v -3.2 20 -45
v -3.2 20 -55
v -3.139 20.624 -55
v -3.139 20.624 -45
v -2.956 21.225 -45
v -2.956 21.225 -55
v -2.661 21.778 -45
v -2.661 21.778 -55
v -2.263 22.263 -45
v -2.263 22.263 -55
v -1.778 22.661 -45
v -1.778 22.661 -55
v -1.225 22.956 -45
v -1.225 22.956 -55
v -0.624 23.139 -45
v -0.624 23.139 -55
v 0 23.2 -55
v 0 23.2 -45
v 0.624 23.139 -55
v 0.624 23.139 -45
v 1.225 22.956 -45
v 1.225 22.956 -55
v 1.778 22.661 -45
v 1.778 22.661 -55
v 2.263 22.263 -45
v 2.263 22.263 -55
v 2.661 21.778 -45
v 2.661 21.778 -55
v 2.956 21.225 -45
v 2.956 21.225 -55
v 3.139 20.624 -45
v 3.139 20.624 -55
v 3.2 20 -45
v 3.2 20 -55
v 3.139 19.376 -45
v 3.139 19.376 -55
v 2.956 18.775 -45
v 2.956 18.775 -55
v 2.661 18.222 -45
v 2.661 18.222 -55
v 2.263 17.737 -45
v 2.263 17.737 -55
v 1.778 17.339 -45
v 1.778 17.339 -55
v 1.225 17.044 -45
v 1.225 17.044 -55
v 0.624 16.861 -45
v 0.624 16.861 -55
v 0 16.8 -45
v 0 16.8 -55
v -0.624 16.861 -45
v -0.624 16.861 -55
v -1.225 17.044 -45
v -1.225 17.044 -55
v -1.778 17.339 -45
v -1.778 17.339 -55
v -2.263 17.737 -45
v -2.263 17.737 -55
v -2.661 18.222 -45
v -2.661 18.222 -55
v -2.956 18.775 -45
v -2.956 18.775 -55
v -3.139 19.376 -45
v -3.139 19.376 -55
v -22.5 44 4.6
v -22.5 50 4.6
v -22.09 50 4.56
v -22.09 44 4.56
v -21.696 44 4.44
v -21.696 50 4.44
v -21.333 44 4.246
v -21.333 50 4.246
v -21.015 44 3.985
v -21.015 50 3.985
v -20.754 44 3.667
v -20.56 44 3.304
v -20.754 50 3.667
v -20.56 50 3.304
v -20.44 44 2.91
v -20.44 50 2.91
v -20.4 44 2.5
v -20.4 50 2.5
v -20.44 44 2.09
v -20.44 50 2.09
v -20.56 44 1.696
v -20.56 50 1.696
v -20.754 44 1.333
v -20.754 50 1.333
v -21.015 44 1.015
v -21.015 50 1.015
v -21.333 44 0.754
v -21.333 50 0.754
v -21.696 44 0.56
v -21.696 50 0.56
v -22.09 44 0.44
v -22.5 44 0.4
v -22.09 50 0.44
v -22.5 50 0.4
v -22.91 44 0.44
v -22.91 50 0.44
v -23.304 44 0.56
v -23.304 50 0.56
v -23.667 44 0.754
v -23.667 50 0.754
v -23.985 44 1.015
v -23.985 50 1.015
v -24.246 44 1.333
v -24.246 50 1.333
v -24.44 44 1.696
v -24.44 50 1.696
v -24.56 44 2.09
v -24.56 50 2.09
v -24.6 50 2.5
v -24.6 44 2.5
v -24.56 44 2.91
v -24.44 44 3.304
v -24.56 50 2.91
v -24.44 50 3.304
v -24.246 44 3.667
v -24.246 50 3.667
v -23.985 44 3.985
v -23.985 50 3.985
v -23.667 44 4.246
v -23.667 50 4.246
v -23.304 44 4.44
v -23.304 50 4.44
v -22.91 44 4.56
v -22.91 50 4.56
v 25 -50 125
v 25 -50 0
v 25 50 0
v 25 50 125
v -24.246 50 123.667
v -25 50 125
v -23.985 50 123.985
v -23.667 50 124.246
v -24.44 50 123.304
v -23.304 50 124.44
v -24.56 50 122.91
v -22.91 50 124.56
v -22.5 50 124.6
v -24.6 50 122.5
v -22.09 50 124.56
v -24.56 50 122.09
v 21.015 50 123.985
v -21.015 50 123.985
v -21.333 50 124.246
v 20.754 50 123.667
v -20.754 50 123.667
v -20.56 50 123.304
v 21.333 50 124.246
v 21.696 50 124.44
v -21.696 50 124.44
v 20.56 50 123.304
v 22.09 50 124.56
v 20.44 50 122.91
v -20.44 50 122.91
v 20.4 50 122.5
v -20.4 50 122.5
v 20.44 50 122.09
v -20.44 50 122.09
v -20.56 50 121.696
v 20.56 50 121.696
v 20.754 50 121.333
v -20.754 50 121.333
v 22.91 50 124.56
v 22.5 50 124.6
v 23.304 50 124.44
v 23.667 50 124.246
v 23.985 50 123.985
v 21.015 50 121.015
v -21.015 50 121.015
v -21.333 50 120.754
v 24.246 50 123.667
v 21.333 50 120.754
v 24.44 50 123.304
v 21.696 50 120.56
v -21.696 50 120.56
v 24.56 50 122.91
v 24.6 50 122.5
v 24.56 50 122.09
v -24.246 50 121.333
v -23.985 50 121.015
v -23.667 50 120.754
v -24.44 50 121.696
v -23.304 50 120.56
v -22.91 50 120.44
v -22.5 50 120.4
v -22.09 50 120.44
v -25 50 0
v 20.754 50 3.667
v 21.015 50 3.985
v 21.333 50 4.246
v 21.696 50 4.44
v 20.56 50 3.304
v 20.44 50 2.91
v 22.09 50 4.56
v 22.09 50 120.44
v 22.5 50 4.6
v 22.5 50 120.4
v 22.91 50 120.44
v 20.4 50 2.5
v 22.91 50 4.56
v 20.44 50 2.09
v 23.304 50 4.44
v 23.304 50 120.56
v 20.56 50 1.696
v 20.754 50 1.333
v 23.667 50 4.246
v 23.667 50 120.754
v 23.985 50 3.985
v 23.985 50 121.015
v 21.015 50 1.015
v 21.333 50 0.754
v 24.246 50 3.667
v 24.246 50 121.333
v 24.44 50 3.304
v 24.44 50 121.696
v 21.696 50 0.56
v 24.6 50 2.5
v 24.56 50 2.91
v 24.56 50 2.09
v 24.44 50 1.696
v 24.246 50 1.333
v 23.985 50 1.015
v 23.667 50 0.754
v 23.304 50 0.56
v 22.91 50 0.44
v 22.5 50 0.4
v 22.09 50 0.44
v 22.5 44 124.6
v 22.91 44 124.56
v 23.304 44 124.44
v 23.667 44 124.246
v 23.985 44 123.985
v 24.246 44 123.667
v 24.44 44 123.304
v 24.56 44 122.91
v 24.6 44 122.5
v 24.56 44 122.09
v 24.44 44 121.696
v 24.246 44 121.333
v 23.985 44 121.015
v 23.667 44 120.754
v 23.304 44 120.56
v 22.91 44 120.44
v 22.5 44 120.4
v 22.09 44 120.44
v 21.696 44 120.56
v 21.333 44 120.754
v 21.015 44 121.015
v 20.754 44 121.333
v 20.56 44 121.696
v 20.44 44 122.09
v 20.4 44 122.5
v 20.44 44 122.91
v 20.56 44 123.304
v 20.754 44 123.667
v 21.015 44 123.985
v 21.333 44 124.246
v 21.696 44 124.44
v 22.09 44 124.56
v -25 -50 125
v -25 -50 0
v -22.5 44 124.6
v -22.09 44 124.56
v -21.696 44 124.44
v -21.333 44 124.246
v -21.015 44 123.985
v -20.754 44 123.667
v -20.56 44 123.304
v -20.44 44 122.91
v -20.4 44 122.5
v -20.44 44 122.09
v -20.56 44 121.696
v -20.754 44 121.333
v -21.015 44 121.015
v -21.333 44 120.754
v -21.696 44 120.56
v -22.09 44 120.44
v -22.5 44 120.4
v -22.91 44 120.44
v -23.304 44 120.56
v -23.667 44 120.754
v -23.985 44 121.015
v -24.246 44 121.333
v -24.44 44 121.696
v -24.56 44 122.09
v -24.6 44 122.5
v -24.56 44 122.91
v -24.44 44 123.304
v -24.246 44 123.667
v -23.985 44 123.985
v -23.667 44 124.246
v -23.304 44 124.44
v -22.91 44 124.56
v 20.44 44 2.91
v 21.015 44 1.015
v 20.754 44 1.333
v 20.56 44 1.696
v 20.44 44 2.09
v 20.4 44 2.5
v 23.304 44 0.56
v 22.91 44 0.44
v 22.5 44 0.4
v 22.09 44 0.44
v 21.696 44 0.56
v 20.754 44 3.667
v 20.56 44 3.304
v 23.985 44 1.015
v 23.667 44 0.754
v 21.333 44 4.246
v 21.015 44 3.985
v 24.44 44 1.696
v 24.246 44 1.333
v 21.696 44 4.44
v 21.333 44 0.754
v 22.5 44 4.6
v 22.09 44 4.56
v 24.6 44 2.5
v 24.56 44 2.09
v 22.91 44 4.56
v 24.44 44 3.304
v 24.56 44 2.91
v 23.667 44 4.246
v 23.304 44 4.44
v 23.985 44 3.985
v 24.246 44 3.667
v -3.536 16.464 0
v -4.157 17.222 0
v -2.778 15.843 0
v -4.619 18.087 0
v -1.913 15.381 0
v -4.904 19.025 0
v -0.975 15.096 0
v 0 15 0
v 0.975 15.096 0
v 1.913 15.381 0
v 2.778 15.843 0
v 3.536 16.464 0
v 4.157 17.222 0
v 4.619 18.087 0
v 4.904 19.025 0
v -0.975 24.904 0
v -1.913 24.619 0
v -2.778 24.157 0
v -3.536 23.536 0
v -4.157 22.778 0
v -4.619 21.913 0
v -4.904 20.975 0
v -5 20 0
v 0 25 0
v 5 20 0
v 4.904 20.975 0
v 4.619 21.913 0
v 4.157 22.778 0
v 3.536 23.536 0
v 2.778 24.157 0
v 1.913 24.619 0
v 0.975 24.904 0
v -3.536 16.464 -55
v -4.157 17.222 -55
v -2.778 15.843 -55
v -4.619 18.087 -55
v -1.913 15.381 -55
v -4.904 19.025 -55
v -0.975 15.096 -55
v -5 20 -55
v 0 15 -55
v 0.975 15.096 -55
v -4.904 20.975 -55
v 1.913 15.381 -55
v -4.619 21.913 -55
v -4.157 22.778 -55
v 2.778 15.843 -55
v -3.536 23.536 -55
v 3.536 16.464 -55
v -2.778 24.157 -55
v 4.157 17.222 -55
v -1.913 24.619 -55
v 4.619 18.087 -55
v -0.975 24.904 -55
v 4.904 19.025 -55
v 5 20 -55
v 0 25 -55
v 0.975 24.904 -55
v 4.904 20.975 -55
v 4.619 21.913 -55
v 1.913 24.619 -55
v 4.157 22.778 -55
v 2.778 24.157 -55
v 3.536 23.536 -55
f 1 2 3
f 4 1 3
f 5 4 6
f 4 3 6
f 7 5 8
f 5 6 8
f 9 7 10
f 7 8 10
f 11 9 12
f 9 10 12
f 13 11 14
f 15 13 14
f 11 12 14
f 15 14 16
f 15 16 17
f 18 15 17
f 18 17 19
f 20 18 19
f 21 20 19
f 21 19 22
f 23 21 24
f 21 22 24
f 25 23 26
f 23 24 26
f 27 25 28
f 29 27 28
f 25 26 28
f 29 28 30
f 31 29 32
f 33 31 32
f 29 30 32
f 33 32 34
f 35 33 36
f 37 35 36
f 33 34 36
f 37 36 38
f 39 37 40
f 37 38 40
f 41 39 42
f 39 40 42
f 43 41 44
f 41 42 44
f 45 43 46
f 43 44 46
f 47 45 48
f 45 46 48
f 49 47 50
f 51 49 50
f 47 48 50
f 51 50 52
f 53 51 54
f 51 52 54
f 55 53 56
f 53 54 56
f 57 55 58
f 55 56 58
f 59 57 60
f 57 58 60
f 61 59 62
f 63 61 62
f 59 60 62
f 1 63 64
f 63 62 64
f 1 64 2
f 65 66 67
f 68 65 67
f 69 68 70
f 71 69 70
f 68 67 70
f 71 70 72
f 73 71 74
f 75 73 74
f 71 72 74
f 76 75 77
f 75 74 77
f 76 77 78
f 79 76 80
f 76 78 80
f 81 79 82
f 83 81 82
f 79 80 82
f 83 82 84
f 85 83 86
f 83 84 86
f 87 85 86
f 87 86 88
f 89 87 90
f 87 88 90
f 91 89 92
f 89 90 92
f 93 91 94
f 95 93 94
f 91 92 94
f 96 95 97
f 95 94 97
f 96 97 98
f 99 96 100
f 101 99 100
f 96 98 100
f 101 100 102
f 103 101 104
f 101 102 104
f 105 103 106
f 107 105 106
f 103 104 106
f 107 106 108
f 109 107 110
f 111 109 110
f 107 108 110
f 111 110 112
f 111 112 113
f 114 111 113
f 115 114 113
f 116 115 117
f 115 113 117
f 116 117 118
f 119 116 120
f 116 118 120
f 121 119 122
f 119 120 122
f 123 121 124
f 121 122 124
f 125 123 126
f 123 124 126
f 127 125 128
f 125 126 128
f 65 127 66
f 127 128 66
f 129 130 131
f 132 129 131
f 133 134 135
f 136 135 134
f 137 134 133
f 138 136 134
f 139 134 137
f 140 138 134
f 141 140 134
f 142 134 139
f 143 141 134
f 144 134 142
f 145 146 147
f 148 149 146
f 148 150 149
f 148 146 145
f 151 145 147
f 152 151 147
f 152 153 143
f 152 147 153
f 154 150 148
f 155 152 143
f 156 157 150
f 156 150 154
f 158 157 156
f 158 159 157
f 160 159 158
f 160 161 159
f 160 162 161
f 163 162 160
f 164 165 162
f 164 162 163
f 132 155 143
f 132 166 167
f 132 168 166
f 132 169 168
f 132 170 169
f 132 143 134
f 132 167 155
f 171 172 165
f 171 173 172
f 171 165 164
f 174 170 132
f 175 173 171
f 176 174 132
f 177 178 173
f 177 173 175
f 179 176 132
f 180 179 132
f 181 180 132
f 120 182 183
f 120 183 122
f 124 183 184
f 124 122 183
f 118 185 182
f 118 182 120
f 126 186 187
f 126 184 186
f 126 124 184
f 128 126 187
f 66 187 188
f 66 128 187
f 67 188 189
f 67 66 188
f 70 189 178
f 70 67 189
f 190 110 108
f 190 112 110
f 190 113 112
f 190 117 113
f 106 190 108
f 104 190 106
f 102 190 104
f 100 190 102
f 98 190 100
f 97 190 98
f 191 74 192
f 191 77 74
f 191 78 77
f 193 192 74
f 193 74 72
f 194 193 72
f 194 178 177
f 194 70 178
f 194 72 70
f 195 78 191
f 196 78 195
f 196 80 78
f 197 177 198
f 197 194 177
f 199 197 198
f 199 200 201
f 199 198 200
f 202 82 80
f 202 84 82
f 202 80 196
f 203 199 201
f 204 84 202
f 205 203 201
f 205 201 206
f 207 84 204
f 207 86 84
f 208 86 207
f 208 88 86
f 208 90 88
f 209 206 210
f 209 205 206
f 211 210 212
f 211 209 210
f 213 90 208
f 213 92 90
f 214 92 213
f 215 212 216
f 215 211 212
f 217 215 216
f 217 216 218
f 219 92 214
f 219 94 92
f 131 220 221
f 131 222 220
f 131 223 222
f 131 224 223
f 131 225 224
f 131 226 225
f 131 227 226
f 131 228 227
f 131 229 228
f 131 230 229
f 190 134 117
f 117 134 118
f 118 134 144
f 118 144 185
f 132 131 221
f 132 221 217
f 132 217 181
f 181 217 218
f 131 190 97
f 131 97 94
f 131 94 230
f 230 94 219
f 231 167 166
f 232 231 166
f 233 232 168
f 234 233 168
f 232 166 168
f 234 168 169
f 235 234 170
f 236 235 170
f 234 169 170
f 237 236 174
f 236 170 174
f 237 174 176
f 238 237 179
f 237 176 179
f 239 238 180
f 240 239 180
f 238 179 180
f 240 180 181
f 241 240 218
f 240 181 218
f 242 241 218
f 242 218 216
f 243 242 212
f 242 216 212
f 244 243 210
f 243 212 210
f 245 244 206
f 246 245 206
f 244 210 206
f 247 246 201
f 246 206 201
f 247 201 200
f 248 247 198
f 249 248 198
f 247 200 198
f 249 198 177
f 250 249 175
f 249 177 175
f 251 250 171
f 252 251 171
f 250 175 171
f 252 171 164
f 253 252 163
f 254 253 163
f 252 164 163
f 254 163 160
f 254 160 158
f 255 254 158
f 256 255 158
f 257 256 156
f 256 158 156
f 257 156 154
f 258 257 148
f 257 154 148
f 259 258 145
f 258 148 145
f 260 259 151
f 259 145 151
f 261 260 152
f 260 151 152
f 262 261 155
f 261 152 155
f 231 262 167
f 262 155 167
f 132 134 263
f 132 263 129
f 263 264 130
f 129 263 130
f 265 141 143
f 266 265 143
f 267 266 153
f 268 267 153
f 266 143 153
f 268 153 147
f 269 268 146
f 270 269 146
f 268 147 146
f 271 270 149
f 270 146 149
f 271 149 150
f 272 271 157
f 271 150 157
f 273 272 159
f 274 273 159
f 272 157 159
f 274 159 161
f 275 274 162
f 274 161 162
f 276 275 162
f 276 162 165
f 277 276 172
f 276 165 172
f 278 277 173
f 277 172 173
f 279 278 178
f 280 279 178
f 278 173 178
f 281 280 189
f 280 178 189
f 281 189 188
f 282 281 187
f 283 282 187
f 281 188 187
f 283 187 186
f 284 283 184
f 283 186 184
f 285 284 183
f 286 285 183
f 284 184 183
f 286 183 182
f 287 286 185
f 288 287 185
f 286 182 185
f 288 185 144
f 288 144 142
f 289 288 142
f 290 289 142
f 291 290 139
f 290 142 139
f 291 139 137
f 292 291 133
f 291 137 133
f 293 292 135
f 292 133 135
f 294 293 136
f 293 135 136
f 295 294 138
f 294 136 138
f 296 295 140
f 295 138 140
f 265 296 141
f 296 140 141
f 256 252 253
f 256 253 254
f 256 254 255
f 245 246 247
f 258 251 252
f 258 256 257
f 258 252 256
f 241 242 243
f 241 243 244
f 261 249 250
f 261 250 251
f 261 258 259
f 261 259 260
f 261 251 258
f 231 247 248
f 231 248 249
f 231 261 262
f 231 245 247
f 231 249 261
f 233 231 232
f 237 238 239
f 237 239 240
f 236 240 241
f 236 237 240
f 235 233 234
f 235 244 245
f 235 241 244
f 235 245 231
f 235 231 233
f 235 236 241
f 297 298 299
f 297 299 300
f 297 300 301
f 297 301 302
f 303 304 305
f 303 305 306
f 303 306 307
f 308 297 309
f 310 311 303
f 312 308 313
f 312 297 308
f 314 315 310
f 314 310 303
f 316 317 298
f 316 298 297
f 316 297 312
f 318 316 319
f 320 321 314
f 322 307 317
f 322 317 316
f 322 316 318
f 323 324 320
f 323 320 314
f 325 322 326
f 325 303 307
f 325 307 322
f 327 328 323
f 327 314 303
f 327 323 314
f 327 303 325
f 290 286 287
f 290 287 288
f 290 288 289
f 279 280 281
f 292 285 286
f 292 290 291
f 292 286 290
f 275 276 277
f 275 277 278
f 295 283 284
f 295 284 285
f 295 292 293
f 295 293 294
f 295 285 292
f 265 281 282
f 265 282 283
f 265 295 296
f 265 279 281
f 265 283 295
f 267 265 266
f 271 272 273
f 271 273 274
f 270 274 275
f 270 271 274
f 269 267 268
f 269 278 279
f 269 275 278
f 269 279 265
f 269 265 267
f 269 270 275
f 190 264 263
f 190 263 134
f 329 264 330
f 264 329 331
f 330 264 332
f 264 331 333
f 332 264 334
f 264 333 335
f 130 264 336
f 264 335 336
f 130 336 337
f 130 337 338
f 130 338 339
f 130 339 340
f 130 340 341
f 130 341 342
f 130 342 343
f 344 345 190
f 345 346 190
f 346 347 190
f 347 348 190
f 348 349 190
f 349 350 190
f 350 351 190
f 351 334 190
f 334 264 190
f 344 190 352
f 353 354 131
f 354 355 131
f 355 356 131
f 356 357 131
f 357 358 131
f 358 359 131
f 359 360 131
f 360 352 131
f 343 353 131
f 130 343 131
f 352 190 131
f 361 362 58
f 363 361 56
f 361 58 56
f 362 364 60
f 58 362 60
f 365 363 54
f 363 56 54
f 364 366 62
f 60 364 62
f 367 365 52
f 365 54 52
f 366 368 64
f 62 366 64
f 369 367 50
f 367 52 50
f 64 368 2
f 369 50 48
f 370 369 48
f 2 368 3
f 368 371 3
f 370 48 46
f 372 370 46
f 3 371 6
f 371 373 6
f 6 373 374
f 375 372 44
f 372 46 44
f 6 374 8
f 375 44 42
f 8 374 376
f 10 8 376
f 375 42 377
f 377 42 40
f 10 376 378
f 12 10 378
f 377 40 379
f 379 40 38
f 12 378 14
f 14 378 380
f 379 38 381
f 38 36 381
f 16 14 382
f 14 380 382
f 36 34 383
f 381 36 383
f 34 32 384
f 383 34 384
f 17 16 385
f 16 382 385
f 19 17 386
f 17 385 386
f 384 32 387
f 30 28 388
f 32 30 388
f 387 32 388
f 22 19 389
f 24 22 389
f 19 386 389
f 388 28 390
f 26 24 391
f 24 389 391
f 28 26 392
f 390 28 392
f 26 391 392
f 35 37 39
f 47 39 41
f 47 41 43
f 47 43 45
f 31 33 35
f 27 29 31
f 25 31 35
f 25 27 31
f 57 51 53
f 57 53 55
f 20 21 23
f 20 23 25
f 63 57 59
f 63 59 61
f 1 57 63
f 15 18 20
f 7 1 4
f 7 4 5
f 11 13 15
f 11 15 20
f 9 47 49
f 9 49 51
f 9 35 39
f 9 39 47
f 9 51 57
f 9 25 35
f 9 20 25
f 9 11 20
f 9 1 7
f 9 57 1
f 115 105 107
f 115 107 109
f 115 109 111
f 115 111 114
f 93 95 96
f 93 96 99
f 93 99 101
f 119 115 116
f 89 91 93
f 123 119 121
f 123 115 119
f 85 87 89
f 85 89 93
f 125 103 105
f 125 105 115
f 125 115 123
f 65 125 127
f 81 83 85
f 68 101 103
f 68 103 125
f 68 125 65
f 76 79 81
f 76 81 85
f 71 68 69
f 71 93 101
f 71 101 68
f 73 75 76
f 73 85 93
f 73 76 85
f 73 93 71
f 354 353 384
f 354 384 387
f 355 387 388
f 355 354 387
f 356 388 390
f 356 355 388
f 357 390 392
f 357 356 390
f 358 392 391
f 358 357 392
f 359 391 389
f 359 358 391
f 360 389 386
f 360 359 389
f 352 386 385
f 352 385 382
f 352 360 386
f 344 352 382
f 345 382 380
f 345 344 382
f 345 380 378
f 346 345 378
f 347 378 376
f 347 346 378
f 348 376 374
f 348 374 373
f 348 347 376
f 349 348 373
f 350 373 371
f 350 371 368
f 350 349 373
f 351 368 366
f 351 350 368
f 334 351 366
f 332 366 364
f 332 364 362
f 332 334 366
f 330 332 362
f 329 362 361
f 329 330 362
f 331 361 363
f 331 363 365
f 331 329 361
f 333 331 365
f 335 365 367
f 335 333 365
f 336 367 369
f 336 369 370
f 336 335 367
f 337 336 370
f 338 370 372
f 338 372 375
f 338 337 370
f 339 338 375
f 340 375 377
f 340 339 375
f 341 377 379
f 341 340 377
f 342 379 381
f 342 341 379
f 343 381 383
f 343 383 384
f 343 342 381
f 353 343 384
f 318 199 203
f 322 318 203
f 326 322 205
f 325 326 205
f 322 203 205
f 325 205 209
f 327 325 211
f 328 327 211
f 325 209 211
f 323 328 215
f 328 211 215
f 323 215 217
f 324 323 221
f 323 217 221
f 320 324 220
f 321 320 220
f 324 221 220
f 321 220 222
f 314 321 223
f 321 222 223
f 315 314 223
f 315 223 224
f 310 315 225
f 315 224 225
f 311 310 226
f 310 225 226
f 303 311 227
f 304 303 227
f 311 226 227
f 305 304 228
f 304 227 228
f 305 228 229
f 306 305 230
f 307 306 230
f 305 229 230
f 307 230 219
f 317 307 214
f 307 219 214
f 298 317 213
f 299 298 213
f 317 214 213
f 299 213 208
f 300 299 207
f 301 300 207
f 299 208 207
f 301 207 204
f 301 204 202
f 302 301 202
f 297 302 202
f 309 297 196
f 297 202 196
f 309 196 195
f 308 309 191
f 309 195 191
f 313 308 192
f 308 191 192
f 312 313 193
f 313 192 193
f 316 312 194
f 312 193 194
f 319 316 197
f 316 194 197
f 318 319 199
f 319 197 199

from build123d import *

# Parameters (mm, degrees)
SKETCH1_W           = 50
SKETCH1_H           = 100
BOSS_EXTRUDE1_DEPTH = 125
SKETCH2_R           = 5
BOSS_EXTRUDE2_DEPTH = 55
SKETCH3_R           = 2.1
CUT_EXTRUDE1_DEPTH  = 6
SKETCH4_R           = 3.2
CUT_EXTRUDE2_DEPTH  = 10


with BuildPart() as part:
    # Sketch1 → Boss-Extrude1 (new body)
    with BuildSketch(Plane.XY):
        Rectangle(SKETCH1_W, SKETCH1_H)
    extrude(amount=BOSS_EXTRUDE1_DEPTH)

    # Sketch2 → Boss-Extrude2 (add)
    with BuildSketch(Plane.XY):
        with Locations((0, 20)):
            Circle(SKETCH2_R)
    extrude(amount=-BOSS_EXTRUDE2_DEPTH)

    # Sketch3 → Cut-Extrude1 (cut)
    with BuildSketch(Plane(origin=(0, 50, 0), x_dir=(1, 0, 0), z_dir=(0, 1, 0))):
        with Locations(Location((-22.5, -2.5, 0), (0, 0, 270))):
            Circle(SKETCH3_R)
        with Locations(Location((22.5, -2.5, 0), (0, 0, 270))):
            Circle(SKETCH3_R)
        with Locations(Location((22.5, -122.5, 0), (0, 0, 270))):
            Circle(SKETCH3_R)
        with Locations(Location((-22.5, -122.5, 0), (0, 0, 270))):
            Circle(SKETCH3_R)
    extrude(amount=-CUT_EXTRUDE1_DEPTH, mode=Mode.SUBTRACT)

    # Sketch4 → Cut-Extrude2 (cut)
    with BuildSketch(Plane(origin=(0, 0, -55), x_dir=(-1, 0, 0), z_dir=(0, 0, -1))):
        with Locations((0, 20)):
            Circle(SKETCH4_R)
    extrude(amount=-CUT_EXTRUDE2_DEPTH, mode=Mode.SUBTRACT)


solid = part.part
